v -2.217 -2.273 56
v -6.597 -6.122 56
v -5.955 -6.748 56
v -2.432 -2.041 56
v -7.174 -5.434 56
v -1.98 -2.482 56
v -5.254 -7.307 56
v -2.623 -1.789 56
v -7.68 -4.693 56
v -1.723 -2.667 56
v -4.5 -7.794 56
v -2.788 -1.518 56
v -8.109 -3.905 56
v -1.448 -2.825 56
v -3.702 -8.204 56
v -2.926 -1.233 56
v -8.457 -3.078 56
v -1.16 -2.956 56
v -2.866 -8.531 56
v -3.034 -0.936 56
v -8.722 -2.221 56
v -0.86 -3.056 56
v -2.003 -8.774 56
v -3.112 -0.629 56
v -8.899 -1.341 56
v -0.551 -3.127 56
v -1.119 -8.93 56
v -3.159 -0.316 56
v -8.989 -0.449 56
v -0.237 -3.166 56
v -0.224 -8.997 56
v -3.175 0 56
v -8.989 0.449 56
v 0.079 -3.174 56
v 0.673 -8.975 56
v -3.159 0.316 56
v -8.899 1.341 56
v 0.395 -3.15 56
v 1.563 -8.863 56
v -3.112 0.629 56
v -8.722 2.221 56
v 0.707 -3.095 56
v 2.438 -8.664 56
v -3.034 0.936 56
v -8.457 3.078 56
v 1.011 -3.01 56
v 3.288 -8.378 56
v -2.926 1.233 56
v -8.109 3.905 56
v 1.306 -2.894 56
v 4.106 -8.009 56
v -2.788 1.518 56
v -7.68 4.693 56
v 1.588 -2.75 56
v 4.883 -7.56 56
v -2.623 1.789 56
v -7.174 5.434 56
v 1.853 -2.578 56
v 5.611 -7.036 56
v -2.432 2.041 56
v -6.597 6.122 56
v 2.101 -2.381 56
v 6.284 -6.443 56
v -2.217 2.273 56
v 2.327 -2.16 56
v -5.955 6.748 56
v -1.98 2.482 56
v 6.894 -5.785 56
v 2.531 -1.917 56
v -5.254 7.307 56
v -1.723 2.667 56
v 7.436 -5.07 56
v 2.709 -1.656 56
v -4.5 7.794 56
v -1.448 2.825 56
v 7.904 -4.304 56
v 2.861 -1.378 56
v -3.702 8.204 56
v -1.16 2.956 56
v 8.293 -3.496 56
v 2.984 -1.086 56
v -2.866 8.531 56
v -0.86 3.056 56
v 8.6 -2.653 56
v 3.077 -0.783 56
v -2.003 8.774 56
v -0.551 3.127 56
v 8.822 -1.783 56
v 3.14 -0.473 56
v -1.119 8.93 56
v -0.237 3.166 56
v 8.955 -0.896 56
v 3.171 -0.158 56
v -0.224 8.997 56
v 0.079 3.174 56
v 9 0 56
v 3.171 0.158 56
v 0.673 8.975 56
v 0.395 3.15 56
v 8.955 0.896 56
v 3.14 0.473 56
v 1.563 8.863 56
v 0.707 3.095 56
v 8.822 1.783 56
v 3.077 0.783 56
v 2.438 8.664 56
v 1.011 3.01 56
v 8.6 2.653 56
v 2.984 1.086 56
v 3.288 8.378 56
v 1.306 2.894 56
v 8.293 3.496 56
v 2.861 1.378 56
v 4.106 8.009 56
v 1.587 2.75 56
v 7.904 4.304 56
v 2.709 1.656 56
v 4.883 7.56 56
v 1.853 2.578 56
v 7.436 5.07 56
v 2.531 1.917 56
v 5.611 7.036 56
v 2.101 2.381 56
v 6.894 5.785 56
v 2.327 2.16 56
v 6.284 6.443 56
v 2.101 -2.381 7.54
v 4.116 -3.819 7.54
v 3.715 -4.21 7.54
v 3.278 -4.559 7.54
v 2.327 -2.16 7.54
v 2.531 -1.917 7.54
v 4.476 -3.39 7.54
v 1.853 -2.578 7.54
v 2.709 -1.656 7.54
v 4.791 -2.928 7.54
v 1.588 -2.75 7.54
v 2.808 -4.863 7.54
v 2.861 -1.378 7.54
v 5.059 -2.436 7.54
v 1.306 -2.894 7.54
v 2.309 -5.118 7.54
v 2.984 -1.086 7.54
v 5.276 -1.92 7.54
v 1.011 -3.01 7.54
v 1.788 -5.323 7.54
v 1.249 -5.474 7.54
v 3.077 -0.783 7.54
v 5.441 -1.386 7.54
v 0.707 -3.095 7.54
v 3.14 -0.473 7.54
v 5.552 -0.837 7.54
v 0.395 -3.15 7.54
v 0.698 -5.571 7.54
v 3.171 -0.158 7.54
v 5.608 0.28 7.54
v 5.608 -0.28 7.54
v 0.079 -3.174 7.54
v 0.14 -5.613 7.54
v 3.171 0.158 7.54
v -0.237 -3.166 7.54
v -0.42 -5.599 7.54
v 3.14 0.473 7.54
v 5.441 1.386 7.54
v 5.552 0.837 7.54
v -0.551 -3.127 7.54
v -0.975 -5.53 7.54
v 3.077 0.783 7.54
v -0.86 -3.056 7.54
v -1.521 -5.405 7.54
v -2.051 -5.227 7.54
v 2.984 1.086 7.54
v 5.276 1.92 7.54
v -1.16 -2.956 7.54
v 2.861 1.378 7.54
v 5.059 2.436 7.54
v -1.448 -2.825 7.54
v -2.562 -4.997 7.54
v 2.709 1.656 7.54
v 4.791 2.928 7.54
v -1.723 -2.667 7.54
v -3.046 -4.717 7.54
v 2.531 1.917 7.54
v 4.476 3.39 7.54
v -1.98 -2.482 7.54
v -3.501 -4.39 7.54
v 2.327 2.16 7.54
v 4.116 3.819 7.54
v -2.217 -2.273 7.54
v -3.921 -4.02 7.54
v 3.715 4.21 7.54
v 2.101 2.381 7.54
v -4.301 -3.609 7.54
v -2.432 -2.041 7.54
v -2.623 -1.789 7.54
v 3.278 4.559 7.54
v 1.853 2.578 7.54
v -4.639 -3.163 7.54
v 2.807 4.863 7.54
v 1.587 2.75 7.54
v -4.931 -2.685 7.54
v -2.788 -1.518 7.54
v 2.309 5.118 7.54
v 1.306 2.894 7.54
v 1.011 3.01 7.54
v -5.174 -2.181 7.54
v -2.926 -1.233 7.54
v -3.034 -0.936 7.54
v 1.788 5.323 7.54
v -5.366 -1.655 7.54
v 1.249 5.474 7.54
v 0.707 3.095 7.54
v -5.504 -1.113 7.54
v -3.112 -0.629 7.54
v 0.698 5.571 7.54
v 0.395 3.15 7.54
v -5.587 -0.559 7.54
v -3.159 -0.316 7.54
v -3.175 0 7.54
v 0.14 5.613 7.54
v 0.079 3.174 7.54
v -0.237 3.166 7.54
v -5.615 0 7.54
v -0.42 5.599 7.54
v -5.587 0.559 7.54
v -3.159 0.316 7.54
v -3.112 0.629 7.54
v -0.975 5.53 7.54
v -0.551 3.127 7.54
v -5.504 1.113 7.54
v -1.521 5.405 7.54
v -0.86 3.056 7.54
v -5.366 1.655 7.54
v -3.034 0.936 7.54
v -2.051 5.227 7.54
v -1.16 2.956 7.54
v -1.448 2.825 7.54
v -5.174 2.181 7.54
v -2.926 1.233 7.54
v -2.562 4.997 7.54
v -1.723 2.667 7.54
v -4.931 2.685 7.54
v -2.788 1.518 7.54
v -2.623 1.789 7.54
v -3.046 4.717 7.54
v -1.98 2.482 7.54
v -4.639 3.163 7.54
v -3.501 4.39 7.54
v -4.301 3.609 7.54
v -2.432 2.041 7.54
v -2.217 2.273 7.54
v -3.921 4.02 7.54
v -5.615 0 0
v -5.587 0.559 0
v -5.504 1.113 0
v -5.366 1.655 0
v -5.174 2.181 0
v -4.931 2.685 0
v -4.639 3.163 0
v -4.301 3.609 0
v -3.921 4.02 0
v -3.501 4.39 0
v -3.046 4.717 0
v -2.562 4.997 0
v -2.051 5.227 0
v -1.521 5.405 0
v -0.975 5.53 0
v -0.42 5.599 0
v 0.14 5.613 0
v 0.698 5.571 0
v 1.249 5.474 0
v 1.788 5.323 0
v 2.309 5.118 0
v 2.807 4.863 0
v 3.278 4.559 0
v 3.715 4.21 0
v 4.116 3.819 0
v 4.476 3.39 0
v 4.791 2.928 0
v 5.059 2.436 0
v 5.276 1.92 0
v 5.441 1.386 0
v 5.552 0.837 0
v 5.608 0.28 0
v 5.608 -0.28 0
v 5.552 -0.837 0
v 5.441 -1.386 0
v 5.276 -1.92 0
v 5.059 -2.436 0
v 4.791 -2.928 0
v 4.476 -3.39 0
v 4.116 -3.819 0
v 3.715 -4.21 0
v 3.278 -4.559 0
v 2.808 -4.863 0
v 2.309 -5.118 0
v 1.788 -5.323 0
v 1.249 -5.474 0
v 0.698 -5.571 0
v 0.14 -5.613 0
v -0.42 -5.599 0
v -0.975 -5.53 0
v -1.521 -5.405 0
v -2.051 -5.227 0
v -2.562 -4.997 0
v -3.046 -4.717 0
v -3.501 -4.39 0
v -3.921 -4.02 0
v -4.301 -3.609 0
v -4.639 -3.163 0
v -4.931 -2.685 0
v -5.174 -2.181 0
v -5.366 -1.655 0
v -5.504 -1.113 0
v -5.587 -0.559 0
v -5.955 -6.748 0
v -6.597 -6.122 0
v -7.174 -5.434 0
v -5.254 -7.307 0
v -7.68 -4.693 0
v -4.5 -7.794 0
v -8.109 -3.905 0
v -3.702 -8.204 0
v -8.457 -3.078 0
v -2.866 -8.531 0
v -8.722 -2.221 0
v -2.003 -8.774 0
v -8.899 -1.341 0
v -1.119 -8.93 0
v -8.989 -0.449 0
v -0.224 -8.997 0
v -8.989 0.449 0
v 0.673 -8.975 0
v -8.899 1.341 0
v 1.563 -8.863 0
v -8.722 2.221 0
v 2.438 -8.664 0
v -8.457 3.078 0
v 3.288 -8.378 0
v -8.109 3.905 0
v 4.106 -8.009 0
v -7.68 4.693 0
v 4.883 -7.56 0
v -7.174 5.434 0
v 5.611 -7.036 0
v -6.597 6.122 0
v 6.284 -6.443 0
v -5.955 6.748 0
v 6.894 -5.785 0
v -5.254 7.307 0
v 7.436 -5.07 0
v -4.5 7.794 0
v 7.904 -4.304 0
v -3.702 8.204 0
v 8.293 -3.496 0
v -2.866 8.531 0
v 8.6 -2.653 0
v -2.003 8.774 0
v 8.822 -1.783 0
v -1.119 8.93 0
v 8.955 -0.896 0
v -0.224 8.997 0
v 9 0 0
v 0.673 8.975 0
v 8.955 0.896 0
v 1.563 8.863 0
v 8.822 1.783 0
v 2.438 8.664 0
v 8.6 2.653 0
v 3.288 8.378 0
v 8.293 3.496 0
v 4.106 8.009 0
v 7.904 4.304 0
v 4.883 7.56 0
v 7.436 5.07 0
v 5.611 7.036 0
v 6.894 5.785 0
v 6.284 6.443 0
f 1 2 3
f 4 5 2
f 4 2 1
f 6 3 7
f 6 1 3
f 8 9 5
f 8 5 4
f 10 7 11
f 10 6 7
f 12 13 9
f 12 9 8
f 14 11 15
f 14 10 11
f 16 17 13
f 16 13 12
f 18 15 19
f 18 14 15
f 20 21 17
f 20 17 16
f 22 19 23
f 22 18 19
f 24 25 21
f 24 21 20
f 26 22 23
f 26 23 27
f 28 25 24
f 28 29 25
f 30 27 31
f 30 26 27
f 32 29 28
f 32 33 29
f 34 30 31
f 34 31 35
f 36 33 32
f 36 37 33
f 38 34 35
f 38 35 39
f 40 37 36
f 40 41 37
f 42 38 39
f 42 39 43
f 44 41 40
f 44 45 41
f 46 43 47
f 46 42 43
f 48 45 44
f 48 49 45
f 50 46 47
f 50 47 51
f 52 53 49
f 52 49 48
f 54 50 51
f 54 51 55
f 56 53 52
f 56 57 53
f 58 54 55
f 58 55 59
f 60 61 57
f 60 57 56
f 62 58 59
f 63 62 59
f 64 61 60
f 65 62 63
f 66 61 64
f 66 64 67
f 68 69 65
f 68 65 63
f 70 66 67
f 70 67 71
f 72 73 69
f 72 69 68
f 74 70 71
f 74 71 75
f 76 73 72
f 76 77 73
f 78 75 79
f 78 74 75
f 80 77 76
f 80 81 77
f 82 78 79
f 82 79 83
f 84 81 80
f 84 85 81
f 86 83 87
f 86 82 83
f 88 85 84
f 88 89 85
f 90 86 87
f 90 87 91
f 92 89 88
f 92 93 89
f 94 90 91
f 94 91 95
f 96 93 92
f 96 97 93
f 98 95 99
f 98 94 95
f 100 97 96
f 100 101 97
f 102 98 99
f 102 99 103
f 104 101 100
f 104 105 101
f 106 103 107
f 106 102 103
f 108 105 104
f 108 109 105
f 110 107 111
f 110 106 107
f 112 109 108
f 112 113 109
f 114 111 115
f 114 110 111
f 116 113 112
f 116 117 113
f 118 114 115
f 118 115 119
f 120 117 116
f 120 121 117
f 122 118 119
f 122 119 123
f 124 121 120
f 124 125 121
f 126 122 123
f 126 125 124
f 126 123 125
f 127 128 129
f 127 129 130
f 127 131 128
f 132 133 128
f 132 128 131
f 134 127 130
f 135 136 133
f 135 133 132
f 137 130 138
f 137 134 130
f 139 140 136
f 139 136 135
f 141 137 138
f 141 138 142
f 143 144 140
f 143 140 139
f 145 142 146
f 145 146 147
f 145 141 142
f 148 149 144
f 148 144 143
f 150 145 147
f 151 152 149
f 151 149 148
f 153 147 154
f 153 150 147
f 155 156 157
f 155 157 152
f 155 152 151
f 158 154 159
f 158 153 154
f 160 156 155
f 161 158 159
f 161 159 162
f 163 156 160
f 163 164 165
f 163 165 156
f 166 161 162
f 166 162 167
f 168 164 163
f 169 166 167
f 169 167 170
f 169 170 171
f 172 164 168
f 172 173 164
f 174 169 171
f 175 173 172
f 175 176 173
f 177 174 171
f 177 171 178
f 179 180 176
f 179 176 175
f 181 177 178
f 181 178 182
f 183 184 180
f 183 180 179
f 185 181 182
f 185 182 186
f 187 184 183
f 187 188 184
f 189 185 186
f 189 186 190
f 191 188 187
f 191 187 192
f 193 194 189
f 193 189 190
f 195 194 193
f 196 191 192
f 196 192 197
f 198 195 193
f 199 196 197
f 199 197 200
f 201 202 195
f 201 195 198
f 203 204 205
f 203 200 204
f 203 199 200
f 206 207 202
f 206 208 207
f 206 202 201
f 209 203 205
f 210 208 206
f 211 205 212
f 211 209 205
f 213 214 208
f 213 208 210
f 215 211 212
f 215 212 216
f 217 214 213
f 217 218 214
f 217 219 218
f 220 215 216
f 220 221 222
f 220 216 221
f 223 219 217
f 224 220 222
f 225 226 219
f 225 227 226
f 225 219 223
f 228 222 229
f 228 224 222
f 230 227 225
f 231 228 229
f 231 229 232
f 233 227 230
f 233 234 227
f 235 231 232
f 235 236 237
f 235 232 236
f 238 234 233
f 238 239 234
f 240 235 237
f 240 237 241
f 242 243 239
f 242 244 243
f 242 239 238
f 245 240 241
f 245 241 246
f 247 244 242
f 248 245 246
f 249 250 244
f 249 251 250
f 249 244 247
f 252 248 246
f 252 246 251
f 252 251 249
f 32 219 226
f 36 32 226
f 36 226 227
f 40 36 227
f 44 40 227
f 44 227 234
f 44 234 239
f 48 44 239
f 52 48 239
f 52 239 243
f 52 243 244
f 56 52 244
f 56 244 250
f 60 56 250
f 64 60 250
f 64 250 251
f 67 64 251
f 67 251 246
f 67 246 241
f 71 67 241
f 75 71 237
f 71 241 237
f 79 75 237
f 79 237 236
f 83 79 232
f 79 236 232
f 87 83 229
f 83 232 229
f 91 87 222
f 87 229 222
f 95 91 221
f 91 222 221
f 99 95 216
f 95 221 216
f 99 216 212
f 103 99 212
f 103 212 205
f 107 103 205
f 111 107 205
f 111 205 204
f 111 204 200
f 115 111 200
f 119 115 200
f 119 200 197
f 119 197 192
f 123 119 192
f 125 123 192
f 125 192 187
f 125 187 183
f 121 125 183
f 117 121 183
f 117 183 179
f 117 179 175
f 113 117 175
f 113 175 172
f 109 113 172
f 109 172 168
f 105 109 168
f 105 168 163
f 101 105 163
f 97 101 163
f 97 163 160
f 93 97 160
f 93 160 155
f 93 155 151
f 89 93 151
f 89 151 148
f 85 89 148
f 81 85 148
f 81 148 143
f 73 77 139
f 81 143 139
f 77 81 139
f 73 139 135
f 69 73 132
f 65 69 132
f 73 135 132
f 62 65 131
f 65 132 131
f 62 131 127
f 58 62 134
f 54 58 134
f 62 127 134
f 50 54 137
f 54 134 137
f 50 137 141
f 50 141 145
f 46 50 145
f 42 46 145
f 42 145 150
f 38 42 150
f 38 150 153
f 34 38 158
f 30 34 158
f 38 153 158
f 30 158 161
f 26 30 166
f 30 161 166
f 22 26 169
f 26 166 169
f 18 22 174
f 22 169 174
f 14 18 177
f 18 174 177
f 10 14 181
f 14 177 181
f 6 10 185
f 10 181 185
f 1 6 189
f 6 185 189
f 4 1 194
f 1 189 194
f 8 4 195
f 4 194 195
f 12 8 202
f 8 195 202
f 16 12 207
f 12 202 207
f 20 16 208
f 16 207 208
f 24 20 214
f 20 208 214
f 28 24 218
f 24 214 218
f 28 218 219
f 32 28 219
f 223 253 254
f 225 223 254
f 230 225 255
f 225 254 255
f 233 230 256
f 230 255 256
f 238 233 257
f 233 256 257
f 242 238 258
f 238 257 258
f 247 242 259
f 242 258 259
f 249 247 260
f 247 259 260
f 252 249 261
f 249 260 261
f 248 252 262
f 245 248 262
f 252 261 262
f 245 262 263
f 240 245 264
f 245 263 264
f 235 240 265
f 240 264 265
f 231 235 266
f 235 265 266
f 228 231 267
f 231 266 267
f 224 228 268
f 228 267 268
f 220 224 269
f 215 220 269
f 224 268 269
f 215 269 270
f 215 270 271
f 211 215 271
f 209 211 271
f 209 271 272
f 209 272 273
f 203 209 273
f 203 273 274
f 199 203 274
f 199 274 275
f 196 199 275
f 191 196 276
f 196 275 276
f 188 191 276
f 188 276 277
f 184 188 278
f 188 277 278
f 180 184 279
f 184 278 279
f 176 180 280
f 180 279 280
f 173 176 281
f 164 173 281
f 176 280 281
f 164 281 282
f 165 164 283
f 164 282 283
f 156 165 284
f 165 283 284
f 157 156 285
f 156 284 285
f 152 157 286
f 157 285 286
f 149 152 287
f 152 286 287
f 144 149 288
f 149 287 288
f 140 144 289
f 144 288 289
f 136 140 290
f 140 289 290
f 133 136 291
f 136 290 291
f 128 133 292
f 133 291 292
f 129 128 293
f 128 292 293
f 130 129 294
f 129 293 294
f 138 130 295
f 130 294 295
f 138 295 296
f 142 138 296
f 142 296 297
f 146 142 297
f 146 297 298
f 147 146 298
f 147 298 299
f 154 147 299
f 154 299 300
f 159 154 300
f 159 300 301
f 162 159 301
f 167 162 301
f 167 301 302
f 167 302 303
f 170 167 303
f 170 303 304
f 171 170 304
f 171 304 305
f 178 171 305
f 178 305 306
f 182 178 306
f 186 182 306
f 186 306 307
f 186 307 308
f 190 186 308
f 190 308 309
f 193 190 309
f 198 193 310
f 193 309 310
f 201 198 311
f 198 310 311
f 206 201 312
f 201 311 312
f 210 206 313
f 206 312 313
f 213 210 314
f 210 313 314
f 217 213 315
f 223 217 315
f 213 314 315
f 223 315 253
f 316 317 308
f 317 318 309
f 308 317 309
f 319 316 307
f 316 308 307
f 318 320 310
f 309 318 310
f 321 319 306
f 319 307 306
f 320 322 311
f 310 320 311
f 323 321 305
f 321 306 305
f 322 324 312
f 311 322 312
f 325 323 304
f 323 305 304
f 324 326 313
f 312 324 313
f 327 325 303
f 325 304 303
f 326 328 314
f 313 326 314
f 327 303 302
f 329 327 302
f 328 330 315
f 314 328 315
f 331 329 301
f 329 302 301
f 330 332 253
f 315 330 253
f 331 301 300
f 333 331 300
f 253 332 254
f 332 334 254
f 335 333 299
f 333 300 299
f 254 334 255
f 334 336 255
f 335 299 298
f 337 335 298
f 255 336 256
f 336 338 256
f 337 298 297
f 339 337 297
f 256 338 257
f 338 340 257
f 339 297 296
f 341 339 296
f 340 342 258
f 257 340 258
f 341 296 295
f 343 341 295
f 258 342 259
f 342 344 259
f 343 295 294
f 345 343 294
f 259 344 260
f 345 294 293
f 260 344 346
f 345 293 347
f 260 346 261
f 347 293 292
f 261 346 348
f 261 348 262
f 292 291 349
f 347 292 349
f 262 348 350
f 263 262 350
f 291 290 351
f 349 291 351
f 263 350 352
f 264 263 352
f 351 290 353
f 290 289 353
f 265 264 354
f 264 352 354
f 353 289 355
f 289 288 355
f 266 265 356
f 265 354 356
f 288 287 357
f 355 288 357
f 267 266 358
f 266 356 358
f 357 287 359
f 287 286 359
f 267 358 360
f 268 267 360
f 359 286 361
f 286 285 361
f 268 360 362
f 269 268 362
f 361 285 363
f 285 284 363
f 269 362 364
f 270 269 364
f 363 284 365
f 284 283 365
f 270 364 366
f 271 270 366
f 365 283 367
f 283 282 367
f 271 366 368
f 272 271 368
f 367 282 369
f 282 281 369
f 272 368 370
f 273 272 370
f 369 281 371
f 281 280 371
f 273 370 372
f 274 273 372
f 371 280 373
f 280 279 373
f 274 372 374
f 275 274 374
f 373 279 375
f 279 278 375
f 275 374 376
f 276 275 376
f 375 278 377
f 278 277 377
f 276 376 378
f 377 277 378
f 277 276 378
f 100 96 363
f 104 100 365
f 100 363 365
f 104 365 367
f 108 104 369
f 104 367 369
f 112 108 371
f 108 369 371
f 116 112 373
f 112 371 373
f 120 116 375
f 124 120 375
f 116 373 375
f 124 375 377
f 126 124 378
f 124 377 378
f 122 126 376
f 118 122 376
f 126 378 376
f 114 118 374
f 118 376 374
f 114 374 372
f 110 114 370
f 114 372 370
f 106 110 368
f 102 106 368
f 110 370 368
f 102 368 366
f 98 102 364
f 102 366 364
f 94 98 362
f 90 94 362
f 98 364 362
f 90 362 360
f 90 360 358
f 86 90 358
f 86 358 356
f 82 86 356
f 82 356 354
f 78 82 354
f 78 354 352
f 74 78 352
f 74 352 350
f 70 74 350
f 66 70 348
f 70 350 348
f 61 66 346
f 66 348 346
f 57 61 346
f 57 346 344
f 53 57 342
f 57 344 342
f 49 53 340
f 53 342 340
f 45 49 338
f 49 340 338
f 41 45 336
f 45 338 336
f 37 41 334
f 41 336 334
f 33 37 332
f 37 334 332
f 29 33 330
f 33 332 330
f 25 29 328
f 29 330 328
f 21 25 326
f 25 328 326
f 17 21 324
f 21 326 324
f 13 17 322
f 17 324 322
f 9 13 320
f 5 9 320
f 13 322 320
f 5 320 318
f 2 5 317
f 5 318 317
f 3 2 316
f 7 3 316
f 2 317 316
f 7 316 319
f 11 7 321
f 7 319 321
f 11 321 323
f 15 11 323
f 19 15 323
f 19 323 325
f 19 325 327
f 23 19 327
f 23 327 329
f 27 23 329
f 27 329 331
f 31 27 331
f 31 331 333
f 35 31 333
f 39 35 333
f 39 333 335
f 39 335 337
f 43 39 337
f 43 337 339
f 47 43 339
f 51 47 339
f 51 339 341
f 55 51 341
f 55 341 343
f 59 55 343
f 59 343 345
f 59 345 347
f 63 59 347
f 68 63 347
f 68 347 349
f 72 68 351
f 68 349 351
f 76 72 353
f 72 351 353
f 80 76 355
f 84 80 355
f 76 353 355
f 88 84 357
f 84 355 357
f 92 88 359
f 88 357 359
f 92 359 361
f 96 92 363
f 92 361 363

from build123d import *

# Parameters (mm, degrees)
ESBO_O1_R                = 9
RESSALTO_EXTRUS_O1_DEPTH = 56
ESBO_O2_R                = 5.615
CORTE_EXTRUS_O1_DEPTH    = 7.54
ESBO_O3_R                = 3.175
CORTE_EXTRUS_O2_DEPTH    = 49.46


with BuildPart() as part:
    # Esboço1 → Ressalto-extrusão1 (new body)
    with BuildSketch(Plane.XY):
        Circle(ESBO_O1_R)
    extrude(amount=RESSALTO_EXTRUS_O1_DEPTH)

    # Esboço2 → Corte-extrusão1 (cut)
    with BuildSketch(Plane(origin=(0, 0, 0), x_dir=(-1, 0, 0), z_dir=(0, 0, -1))):
        Circle(ESBO_O2_R)
    extrude(amount=-CORTE_EXTRUS_O1_DEPTH, mode=Mode.SUBTRACT)

    # Esboço3 → Corte-extrusão2 (cut, through all)
    with BuildSketch(Plane(origin=(0, 0, 7.54), x_dir=(-1, 0, 0), z_dir=(0, 0, -1))):
        Circle(ESBO_O3_R)
    extrude(amount=-CORTE_EXTRUS_O2_DEPTH, mode=Mode.SUBTRACT)


solid = part.part
